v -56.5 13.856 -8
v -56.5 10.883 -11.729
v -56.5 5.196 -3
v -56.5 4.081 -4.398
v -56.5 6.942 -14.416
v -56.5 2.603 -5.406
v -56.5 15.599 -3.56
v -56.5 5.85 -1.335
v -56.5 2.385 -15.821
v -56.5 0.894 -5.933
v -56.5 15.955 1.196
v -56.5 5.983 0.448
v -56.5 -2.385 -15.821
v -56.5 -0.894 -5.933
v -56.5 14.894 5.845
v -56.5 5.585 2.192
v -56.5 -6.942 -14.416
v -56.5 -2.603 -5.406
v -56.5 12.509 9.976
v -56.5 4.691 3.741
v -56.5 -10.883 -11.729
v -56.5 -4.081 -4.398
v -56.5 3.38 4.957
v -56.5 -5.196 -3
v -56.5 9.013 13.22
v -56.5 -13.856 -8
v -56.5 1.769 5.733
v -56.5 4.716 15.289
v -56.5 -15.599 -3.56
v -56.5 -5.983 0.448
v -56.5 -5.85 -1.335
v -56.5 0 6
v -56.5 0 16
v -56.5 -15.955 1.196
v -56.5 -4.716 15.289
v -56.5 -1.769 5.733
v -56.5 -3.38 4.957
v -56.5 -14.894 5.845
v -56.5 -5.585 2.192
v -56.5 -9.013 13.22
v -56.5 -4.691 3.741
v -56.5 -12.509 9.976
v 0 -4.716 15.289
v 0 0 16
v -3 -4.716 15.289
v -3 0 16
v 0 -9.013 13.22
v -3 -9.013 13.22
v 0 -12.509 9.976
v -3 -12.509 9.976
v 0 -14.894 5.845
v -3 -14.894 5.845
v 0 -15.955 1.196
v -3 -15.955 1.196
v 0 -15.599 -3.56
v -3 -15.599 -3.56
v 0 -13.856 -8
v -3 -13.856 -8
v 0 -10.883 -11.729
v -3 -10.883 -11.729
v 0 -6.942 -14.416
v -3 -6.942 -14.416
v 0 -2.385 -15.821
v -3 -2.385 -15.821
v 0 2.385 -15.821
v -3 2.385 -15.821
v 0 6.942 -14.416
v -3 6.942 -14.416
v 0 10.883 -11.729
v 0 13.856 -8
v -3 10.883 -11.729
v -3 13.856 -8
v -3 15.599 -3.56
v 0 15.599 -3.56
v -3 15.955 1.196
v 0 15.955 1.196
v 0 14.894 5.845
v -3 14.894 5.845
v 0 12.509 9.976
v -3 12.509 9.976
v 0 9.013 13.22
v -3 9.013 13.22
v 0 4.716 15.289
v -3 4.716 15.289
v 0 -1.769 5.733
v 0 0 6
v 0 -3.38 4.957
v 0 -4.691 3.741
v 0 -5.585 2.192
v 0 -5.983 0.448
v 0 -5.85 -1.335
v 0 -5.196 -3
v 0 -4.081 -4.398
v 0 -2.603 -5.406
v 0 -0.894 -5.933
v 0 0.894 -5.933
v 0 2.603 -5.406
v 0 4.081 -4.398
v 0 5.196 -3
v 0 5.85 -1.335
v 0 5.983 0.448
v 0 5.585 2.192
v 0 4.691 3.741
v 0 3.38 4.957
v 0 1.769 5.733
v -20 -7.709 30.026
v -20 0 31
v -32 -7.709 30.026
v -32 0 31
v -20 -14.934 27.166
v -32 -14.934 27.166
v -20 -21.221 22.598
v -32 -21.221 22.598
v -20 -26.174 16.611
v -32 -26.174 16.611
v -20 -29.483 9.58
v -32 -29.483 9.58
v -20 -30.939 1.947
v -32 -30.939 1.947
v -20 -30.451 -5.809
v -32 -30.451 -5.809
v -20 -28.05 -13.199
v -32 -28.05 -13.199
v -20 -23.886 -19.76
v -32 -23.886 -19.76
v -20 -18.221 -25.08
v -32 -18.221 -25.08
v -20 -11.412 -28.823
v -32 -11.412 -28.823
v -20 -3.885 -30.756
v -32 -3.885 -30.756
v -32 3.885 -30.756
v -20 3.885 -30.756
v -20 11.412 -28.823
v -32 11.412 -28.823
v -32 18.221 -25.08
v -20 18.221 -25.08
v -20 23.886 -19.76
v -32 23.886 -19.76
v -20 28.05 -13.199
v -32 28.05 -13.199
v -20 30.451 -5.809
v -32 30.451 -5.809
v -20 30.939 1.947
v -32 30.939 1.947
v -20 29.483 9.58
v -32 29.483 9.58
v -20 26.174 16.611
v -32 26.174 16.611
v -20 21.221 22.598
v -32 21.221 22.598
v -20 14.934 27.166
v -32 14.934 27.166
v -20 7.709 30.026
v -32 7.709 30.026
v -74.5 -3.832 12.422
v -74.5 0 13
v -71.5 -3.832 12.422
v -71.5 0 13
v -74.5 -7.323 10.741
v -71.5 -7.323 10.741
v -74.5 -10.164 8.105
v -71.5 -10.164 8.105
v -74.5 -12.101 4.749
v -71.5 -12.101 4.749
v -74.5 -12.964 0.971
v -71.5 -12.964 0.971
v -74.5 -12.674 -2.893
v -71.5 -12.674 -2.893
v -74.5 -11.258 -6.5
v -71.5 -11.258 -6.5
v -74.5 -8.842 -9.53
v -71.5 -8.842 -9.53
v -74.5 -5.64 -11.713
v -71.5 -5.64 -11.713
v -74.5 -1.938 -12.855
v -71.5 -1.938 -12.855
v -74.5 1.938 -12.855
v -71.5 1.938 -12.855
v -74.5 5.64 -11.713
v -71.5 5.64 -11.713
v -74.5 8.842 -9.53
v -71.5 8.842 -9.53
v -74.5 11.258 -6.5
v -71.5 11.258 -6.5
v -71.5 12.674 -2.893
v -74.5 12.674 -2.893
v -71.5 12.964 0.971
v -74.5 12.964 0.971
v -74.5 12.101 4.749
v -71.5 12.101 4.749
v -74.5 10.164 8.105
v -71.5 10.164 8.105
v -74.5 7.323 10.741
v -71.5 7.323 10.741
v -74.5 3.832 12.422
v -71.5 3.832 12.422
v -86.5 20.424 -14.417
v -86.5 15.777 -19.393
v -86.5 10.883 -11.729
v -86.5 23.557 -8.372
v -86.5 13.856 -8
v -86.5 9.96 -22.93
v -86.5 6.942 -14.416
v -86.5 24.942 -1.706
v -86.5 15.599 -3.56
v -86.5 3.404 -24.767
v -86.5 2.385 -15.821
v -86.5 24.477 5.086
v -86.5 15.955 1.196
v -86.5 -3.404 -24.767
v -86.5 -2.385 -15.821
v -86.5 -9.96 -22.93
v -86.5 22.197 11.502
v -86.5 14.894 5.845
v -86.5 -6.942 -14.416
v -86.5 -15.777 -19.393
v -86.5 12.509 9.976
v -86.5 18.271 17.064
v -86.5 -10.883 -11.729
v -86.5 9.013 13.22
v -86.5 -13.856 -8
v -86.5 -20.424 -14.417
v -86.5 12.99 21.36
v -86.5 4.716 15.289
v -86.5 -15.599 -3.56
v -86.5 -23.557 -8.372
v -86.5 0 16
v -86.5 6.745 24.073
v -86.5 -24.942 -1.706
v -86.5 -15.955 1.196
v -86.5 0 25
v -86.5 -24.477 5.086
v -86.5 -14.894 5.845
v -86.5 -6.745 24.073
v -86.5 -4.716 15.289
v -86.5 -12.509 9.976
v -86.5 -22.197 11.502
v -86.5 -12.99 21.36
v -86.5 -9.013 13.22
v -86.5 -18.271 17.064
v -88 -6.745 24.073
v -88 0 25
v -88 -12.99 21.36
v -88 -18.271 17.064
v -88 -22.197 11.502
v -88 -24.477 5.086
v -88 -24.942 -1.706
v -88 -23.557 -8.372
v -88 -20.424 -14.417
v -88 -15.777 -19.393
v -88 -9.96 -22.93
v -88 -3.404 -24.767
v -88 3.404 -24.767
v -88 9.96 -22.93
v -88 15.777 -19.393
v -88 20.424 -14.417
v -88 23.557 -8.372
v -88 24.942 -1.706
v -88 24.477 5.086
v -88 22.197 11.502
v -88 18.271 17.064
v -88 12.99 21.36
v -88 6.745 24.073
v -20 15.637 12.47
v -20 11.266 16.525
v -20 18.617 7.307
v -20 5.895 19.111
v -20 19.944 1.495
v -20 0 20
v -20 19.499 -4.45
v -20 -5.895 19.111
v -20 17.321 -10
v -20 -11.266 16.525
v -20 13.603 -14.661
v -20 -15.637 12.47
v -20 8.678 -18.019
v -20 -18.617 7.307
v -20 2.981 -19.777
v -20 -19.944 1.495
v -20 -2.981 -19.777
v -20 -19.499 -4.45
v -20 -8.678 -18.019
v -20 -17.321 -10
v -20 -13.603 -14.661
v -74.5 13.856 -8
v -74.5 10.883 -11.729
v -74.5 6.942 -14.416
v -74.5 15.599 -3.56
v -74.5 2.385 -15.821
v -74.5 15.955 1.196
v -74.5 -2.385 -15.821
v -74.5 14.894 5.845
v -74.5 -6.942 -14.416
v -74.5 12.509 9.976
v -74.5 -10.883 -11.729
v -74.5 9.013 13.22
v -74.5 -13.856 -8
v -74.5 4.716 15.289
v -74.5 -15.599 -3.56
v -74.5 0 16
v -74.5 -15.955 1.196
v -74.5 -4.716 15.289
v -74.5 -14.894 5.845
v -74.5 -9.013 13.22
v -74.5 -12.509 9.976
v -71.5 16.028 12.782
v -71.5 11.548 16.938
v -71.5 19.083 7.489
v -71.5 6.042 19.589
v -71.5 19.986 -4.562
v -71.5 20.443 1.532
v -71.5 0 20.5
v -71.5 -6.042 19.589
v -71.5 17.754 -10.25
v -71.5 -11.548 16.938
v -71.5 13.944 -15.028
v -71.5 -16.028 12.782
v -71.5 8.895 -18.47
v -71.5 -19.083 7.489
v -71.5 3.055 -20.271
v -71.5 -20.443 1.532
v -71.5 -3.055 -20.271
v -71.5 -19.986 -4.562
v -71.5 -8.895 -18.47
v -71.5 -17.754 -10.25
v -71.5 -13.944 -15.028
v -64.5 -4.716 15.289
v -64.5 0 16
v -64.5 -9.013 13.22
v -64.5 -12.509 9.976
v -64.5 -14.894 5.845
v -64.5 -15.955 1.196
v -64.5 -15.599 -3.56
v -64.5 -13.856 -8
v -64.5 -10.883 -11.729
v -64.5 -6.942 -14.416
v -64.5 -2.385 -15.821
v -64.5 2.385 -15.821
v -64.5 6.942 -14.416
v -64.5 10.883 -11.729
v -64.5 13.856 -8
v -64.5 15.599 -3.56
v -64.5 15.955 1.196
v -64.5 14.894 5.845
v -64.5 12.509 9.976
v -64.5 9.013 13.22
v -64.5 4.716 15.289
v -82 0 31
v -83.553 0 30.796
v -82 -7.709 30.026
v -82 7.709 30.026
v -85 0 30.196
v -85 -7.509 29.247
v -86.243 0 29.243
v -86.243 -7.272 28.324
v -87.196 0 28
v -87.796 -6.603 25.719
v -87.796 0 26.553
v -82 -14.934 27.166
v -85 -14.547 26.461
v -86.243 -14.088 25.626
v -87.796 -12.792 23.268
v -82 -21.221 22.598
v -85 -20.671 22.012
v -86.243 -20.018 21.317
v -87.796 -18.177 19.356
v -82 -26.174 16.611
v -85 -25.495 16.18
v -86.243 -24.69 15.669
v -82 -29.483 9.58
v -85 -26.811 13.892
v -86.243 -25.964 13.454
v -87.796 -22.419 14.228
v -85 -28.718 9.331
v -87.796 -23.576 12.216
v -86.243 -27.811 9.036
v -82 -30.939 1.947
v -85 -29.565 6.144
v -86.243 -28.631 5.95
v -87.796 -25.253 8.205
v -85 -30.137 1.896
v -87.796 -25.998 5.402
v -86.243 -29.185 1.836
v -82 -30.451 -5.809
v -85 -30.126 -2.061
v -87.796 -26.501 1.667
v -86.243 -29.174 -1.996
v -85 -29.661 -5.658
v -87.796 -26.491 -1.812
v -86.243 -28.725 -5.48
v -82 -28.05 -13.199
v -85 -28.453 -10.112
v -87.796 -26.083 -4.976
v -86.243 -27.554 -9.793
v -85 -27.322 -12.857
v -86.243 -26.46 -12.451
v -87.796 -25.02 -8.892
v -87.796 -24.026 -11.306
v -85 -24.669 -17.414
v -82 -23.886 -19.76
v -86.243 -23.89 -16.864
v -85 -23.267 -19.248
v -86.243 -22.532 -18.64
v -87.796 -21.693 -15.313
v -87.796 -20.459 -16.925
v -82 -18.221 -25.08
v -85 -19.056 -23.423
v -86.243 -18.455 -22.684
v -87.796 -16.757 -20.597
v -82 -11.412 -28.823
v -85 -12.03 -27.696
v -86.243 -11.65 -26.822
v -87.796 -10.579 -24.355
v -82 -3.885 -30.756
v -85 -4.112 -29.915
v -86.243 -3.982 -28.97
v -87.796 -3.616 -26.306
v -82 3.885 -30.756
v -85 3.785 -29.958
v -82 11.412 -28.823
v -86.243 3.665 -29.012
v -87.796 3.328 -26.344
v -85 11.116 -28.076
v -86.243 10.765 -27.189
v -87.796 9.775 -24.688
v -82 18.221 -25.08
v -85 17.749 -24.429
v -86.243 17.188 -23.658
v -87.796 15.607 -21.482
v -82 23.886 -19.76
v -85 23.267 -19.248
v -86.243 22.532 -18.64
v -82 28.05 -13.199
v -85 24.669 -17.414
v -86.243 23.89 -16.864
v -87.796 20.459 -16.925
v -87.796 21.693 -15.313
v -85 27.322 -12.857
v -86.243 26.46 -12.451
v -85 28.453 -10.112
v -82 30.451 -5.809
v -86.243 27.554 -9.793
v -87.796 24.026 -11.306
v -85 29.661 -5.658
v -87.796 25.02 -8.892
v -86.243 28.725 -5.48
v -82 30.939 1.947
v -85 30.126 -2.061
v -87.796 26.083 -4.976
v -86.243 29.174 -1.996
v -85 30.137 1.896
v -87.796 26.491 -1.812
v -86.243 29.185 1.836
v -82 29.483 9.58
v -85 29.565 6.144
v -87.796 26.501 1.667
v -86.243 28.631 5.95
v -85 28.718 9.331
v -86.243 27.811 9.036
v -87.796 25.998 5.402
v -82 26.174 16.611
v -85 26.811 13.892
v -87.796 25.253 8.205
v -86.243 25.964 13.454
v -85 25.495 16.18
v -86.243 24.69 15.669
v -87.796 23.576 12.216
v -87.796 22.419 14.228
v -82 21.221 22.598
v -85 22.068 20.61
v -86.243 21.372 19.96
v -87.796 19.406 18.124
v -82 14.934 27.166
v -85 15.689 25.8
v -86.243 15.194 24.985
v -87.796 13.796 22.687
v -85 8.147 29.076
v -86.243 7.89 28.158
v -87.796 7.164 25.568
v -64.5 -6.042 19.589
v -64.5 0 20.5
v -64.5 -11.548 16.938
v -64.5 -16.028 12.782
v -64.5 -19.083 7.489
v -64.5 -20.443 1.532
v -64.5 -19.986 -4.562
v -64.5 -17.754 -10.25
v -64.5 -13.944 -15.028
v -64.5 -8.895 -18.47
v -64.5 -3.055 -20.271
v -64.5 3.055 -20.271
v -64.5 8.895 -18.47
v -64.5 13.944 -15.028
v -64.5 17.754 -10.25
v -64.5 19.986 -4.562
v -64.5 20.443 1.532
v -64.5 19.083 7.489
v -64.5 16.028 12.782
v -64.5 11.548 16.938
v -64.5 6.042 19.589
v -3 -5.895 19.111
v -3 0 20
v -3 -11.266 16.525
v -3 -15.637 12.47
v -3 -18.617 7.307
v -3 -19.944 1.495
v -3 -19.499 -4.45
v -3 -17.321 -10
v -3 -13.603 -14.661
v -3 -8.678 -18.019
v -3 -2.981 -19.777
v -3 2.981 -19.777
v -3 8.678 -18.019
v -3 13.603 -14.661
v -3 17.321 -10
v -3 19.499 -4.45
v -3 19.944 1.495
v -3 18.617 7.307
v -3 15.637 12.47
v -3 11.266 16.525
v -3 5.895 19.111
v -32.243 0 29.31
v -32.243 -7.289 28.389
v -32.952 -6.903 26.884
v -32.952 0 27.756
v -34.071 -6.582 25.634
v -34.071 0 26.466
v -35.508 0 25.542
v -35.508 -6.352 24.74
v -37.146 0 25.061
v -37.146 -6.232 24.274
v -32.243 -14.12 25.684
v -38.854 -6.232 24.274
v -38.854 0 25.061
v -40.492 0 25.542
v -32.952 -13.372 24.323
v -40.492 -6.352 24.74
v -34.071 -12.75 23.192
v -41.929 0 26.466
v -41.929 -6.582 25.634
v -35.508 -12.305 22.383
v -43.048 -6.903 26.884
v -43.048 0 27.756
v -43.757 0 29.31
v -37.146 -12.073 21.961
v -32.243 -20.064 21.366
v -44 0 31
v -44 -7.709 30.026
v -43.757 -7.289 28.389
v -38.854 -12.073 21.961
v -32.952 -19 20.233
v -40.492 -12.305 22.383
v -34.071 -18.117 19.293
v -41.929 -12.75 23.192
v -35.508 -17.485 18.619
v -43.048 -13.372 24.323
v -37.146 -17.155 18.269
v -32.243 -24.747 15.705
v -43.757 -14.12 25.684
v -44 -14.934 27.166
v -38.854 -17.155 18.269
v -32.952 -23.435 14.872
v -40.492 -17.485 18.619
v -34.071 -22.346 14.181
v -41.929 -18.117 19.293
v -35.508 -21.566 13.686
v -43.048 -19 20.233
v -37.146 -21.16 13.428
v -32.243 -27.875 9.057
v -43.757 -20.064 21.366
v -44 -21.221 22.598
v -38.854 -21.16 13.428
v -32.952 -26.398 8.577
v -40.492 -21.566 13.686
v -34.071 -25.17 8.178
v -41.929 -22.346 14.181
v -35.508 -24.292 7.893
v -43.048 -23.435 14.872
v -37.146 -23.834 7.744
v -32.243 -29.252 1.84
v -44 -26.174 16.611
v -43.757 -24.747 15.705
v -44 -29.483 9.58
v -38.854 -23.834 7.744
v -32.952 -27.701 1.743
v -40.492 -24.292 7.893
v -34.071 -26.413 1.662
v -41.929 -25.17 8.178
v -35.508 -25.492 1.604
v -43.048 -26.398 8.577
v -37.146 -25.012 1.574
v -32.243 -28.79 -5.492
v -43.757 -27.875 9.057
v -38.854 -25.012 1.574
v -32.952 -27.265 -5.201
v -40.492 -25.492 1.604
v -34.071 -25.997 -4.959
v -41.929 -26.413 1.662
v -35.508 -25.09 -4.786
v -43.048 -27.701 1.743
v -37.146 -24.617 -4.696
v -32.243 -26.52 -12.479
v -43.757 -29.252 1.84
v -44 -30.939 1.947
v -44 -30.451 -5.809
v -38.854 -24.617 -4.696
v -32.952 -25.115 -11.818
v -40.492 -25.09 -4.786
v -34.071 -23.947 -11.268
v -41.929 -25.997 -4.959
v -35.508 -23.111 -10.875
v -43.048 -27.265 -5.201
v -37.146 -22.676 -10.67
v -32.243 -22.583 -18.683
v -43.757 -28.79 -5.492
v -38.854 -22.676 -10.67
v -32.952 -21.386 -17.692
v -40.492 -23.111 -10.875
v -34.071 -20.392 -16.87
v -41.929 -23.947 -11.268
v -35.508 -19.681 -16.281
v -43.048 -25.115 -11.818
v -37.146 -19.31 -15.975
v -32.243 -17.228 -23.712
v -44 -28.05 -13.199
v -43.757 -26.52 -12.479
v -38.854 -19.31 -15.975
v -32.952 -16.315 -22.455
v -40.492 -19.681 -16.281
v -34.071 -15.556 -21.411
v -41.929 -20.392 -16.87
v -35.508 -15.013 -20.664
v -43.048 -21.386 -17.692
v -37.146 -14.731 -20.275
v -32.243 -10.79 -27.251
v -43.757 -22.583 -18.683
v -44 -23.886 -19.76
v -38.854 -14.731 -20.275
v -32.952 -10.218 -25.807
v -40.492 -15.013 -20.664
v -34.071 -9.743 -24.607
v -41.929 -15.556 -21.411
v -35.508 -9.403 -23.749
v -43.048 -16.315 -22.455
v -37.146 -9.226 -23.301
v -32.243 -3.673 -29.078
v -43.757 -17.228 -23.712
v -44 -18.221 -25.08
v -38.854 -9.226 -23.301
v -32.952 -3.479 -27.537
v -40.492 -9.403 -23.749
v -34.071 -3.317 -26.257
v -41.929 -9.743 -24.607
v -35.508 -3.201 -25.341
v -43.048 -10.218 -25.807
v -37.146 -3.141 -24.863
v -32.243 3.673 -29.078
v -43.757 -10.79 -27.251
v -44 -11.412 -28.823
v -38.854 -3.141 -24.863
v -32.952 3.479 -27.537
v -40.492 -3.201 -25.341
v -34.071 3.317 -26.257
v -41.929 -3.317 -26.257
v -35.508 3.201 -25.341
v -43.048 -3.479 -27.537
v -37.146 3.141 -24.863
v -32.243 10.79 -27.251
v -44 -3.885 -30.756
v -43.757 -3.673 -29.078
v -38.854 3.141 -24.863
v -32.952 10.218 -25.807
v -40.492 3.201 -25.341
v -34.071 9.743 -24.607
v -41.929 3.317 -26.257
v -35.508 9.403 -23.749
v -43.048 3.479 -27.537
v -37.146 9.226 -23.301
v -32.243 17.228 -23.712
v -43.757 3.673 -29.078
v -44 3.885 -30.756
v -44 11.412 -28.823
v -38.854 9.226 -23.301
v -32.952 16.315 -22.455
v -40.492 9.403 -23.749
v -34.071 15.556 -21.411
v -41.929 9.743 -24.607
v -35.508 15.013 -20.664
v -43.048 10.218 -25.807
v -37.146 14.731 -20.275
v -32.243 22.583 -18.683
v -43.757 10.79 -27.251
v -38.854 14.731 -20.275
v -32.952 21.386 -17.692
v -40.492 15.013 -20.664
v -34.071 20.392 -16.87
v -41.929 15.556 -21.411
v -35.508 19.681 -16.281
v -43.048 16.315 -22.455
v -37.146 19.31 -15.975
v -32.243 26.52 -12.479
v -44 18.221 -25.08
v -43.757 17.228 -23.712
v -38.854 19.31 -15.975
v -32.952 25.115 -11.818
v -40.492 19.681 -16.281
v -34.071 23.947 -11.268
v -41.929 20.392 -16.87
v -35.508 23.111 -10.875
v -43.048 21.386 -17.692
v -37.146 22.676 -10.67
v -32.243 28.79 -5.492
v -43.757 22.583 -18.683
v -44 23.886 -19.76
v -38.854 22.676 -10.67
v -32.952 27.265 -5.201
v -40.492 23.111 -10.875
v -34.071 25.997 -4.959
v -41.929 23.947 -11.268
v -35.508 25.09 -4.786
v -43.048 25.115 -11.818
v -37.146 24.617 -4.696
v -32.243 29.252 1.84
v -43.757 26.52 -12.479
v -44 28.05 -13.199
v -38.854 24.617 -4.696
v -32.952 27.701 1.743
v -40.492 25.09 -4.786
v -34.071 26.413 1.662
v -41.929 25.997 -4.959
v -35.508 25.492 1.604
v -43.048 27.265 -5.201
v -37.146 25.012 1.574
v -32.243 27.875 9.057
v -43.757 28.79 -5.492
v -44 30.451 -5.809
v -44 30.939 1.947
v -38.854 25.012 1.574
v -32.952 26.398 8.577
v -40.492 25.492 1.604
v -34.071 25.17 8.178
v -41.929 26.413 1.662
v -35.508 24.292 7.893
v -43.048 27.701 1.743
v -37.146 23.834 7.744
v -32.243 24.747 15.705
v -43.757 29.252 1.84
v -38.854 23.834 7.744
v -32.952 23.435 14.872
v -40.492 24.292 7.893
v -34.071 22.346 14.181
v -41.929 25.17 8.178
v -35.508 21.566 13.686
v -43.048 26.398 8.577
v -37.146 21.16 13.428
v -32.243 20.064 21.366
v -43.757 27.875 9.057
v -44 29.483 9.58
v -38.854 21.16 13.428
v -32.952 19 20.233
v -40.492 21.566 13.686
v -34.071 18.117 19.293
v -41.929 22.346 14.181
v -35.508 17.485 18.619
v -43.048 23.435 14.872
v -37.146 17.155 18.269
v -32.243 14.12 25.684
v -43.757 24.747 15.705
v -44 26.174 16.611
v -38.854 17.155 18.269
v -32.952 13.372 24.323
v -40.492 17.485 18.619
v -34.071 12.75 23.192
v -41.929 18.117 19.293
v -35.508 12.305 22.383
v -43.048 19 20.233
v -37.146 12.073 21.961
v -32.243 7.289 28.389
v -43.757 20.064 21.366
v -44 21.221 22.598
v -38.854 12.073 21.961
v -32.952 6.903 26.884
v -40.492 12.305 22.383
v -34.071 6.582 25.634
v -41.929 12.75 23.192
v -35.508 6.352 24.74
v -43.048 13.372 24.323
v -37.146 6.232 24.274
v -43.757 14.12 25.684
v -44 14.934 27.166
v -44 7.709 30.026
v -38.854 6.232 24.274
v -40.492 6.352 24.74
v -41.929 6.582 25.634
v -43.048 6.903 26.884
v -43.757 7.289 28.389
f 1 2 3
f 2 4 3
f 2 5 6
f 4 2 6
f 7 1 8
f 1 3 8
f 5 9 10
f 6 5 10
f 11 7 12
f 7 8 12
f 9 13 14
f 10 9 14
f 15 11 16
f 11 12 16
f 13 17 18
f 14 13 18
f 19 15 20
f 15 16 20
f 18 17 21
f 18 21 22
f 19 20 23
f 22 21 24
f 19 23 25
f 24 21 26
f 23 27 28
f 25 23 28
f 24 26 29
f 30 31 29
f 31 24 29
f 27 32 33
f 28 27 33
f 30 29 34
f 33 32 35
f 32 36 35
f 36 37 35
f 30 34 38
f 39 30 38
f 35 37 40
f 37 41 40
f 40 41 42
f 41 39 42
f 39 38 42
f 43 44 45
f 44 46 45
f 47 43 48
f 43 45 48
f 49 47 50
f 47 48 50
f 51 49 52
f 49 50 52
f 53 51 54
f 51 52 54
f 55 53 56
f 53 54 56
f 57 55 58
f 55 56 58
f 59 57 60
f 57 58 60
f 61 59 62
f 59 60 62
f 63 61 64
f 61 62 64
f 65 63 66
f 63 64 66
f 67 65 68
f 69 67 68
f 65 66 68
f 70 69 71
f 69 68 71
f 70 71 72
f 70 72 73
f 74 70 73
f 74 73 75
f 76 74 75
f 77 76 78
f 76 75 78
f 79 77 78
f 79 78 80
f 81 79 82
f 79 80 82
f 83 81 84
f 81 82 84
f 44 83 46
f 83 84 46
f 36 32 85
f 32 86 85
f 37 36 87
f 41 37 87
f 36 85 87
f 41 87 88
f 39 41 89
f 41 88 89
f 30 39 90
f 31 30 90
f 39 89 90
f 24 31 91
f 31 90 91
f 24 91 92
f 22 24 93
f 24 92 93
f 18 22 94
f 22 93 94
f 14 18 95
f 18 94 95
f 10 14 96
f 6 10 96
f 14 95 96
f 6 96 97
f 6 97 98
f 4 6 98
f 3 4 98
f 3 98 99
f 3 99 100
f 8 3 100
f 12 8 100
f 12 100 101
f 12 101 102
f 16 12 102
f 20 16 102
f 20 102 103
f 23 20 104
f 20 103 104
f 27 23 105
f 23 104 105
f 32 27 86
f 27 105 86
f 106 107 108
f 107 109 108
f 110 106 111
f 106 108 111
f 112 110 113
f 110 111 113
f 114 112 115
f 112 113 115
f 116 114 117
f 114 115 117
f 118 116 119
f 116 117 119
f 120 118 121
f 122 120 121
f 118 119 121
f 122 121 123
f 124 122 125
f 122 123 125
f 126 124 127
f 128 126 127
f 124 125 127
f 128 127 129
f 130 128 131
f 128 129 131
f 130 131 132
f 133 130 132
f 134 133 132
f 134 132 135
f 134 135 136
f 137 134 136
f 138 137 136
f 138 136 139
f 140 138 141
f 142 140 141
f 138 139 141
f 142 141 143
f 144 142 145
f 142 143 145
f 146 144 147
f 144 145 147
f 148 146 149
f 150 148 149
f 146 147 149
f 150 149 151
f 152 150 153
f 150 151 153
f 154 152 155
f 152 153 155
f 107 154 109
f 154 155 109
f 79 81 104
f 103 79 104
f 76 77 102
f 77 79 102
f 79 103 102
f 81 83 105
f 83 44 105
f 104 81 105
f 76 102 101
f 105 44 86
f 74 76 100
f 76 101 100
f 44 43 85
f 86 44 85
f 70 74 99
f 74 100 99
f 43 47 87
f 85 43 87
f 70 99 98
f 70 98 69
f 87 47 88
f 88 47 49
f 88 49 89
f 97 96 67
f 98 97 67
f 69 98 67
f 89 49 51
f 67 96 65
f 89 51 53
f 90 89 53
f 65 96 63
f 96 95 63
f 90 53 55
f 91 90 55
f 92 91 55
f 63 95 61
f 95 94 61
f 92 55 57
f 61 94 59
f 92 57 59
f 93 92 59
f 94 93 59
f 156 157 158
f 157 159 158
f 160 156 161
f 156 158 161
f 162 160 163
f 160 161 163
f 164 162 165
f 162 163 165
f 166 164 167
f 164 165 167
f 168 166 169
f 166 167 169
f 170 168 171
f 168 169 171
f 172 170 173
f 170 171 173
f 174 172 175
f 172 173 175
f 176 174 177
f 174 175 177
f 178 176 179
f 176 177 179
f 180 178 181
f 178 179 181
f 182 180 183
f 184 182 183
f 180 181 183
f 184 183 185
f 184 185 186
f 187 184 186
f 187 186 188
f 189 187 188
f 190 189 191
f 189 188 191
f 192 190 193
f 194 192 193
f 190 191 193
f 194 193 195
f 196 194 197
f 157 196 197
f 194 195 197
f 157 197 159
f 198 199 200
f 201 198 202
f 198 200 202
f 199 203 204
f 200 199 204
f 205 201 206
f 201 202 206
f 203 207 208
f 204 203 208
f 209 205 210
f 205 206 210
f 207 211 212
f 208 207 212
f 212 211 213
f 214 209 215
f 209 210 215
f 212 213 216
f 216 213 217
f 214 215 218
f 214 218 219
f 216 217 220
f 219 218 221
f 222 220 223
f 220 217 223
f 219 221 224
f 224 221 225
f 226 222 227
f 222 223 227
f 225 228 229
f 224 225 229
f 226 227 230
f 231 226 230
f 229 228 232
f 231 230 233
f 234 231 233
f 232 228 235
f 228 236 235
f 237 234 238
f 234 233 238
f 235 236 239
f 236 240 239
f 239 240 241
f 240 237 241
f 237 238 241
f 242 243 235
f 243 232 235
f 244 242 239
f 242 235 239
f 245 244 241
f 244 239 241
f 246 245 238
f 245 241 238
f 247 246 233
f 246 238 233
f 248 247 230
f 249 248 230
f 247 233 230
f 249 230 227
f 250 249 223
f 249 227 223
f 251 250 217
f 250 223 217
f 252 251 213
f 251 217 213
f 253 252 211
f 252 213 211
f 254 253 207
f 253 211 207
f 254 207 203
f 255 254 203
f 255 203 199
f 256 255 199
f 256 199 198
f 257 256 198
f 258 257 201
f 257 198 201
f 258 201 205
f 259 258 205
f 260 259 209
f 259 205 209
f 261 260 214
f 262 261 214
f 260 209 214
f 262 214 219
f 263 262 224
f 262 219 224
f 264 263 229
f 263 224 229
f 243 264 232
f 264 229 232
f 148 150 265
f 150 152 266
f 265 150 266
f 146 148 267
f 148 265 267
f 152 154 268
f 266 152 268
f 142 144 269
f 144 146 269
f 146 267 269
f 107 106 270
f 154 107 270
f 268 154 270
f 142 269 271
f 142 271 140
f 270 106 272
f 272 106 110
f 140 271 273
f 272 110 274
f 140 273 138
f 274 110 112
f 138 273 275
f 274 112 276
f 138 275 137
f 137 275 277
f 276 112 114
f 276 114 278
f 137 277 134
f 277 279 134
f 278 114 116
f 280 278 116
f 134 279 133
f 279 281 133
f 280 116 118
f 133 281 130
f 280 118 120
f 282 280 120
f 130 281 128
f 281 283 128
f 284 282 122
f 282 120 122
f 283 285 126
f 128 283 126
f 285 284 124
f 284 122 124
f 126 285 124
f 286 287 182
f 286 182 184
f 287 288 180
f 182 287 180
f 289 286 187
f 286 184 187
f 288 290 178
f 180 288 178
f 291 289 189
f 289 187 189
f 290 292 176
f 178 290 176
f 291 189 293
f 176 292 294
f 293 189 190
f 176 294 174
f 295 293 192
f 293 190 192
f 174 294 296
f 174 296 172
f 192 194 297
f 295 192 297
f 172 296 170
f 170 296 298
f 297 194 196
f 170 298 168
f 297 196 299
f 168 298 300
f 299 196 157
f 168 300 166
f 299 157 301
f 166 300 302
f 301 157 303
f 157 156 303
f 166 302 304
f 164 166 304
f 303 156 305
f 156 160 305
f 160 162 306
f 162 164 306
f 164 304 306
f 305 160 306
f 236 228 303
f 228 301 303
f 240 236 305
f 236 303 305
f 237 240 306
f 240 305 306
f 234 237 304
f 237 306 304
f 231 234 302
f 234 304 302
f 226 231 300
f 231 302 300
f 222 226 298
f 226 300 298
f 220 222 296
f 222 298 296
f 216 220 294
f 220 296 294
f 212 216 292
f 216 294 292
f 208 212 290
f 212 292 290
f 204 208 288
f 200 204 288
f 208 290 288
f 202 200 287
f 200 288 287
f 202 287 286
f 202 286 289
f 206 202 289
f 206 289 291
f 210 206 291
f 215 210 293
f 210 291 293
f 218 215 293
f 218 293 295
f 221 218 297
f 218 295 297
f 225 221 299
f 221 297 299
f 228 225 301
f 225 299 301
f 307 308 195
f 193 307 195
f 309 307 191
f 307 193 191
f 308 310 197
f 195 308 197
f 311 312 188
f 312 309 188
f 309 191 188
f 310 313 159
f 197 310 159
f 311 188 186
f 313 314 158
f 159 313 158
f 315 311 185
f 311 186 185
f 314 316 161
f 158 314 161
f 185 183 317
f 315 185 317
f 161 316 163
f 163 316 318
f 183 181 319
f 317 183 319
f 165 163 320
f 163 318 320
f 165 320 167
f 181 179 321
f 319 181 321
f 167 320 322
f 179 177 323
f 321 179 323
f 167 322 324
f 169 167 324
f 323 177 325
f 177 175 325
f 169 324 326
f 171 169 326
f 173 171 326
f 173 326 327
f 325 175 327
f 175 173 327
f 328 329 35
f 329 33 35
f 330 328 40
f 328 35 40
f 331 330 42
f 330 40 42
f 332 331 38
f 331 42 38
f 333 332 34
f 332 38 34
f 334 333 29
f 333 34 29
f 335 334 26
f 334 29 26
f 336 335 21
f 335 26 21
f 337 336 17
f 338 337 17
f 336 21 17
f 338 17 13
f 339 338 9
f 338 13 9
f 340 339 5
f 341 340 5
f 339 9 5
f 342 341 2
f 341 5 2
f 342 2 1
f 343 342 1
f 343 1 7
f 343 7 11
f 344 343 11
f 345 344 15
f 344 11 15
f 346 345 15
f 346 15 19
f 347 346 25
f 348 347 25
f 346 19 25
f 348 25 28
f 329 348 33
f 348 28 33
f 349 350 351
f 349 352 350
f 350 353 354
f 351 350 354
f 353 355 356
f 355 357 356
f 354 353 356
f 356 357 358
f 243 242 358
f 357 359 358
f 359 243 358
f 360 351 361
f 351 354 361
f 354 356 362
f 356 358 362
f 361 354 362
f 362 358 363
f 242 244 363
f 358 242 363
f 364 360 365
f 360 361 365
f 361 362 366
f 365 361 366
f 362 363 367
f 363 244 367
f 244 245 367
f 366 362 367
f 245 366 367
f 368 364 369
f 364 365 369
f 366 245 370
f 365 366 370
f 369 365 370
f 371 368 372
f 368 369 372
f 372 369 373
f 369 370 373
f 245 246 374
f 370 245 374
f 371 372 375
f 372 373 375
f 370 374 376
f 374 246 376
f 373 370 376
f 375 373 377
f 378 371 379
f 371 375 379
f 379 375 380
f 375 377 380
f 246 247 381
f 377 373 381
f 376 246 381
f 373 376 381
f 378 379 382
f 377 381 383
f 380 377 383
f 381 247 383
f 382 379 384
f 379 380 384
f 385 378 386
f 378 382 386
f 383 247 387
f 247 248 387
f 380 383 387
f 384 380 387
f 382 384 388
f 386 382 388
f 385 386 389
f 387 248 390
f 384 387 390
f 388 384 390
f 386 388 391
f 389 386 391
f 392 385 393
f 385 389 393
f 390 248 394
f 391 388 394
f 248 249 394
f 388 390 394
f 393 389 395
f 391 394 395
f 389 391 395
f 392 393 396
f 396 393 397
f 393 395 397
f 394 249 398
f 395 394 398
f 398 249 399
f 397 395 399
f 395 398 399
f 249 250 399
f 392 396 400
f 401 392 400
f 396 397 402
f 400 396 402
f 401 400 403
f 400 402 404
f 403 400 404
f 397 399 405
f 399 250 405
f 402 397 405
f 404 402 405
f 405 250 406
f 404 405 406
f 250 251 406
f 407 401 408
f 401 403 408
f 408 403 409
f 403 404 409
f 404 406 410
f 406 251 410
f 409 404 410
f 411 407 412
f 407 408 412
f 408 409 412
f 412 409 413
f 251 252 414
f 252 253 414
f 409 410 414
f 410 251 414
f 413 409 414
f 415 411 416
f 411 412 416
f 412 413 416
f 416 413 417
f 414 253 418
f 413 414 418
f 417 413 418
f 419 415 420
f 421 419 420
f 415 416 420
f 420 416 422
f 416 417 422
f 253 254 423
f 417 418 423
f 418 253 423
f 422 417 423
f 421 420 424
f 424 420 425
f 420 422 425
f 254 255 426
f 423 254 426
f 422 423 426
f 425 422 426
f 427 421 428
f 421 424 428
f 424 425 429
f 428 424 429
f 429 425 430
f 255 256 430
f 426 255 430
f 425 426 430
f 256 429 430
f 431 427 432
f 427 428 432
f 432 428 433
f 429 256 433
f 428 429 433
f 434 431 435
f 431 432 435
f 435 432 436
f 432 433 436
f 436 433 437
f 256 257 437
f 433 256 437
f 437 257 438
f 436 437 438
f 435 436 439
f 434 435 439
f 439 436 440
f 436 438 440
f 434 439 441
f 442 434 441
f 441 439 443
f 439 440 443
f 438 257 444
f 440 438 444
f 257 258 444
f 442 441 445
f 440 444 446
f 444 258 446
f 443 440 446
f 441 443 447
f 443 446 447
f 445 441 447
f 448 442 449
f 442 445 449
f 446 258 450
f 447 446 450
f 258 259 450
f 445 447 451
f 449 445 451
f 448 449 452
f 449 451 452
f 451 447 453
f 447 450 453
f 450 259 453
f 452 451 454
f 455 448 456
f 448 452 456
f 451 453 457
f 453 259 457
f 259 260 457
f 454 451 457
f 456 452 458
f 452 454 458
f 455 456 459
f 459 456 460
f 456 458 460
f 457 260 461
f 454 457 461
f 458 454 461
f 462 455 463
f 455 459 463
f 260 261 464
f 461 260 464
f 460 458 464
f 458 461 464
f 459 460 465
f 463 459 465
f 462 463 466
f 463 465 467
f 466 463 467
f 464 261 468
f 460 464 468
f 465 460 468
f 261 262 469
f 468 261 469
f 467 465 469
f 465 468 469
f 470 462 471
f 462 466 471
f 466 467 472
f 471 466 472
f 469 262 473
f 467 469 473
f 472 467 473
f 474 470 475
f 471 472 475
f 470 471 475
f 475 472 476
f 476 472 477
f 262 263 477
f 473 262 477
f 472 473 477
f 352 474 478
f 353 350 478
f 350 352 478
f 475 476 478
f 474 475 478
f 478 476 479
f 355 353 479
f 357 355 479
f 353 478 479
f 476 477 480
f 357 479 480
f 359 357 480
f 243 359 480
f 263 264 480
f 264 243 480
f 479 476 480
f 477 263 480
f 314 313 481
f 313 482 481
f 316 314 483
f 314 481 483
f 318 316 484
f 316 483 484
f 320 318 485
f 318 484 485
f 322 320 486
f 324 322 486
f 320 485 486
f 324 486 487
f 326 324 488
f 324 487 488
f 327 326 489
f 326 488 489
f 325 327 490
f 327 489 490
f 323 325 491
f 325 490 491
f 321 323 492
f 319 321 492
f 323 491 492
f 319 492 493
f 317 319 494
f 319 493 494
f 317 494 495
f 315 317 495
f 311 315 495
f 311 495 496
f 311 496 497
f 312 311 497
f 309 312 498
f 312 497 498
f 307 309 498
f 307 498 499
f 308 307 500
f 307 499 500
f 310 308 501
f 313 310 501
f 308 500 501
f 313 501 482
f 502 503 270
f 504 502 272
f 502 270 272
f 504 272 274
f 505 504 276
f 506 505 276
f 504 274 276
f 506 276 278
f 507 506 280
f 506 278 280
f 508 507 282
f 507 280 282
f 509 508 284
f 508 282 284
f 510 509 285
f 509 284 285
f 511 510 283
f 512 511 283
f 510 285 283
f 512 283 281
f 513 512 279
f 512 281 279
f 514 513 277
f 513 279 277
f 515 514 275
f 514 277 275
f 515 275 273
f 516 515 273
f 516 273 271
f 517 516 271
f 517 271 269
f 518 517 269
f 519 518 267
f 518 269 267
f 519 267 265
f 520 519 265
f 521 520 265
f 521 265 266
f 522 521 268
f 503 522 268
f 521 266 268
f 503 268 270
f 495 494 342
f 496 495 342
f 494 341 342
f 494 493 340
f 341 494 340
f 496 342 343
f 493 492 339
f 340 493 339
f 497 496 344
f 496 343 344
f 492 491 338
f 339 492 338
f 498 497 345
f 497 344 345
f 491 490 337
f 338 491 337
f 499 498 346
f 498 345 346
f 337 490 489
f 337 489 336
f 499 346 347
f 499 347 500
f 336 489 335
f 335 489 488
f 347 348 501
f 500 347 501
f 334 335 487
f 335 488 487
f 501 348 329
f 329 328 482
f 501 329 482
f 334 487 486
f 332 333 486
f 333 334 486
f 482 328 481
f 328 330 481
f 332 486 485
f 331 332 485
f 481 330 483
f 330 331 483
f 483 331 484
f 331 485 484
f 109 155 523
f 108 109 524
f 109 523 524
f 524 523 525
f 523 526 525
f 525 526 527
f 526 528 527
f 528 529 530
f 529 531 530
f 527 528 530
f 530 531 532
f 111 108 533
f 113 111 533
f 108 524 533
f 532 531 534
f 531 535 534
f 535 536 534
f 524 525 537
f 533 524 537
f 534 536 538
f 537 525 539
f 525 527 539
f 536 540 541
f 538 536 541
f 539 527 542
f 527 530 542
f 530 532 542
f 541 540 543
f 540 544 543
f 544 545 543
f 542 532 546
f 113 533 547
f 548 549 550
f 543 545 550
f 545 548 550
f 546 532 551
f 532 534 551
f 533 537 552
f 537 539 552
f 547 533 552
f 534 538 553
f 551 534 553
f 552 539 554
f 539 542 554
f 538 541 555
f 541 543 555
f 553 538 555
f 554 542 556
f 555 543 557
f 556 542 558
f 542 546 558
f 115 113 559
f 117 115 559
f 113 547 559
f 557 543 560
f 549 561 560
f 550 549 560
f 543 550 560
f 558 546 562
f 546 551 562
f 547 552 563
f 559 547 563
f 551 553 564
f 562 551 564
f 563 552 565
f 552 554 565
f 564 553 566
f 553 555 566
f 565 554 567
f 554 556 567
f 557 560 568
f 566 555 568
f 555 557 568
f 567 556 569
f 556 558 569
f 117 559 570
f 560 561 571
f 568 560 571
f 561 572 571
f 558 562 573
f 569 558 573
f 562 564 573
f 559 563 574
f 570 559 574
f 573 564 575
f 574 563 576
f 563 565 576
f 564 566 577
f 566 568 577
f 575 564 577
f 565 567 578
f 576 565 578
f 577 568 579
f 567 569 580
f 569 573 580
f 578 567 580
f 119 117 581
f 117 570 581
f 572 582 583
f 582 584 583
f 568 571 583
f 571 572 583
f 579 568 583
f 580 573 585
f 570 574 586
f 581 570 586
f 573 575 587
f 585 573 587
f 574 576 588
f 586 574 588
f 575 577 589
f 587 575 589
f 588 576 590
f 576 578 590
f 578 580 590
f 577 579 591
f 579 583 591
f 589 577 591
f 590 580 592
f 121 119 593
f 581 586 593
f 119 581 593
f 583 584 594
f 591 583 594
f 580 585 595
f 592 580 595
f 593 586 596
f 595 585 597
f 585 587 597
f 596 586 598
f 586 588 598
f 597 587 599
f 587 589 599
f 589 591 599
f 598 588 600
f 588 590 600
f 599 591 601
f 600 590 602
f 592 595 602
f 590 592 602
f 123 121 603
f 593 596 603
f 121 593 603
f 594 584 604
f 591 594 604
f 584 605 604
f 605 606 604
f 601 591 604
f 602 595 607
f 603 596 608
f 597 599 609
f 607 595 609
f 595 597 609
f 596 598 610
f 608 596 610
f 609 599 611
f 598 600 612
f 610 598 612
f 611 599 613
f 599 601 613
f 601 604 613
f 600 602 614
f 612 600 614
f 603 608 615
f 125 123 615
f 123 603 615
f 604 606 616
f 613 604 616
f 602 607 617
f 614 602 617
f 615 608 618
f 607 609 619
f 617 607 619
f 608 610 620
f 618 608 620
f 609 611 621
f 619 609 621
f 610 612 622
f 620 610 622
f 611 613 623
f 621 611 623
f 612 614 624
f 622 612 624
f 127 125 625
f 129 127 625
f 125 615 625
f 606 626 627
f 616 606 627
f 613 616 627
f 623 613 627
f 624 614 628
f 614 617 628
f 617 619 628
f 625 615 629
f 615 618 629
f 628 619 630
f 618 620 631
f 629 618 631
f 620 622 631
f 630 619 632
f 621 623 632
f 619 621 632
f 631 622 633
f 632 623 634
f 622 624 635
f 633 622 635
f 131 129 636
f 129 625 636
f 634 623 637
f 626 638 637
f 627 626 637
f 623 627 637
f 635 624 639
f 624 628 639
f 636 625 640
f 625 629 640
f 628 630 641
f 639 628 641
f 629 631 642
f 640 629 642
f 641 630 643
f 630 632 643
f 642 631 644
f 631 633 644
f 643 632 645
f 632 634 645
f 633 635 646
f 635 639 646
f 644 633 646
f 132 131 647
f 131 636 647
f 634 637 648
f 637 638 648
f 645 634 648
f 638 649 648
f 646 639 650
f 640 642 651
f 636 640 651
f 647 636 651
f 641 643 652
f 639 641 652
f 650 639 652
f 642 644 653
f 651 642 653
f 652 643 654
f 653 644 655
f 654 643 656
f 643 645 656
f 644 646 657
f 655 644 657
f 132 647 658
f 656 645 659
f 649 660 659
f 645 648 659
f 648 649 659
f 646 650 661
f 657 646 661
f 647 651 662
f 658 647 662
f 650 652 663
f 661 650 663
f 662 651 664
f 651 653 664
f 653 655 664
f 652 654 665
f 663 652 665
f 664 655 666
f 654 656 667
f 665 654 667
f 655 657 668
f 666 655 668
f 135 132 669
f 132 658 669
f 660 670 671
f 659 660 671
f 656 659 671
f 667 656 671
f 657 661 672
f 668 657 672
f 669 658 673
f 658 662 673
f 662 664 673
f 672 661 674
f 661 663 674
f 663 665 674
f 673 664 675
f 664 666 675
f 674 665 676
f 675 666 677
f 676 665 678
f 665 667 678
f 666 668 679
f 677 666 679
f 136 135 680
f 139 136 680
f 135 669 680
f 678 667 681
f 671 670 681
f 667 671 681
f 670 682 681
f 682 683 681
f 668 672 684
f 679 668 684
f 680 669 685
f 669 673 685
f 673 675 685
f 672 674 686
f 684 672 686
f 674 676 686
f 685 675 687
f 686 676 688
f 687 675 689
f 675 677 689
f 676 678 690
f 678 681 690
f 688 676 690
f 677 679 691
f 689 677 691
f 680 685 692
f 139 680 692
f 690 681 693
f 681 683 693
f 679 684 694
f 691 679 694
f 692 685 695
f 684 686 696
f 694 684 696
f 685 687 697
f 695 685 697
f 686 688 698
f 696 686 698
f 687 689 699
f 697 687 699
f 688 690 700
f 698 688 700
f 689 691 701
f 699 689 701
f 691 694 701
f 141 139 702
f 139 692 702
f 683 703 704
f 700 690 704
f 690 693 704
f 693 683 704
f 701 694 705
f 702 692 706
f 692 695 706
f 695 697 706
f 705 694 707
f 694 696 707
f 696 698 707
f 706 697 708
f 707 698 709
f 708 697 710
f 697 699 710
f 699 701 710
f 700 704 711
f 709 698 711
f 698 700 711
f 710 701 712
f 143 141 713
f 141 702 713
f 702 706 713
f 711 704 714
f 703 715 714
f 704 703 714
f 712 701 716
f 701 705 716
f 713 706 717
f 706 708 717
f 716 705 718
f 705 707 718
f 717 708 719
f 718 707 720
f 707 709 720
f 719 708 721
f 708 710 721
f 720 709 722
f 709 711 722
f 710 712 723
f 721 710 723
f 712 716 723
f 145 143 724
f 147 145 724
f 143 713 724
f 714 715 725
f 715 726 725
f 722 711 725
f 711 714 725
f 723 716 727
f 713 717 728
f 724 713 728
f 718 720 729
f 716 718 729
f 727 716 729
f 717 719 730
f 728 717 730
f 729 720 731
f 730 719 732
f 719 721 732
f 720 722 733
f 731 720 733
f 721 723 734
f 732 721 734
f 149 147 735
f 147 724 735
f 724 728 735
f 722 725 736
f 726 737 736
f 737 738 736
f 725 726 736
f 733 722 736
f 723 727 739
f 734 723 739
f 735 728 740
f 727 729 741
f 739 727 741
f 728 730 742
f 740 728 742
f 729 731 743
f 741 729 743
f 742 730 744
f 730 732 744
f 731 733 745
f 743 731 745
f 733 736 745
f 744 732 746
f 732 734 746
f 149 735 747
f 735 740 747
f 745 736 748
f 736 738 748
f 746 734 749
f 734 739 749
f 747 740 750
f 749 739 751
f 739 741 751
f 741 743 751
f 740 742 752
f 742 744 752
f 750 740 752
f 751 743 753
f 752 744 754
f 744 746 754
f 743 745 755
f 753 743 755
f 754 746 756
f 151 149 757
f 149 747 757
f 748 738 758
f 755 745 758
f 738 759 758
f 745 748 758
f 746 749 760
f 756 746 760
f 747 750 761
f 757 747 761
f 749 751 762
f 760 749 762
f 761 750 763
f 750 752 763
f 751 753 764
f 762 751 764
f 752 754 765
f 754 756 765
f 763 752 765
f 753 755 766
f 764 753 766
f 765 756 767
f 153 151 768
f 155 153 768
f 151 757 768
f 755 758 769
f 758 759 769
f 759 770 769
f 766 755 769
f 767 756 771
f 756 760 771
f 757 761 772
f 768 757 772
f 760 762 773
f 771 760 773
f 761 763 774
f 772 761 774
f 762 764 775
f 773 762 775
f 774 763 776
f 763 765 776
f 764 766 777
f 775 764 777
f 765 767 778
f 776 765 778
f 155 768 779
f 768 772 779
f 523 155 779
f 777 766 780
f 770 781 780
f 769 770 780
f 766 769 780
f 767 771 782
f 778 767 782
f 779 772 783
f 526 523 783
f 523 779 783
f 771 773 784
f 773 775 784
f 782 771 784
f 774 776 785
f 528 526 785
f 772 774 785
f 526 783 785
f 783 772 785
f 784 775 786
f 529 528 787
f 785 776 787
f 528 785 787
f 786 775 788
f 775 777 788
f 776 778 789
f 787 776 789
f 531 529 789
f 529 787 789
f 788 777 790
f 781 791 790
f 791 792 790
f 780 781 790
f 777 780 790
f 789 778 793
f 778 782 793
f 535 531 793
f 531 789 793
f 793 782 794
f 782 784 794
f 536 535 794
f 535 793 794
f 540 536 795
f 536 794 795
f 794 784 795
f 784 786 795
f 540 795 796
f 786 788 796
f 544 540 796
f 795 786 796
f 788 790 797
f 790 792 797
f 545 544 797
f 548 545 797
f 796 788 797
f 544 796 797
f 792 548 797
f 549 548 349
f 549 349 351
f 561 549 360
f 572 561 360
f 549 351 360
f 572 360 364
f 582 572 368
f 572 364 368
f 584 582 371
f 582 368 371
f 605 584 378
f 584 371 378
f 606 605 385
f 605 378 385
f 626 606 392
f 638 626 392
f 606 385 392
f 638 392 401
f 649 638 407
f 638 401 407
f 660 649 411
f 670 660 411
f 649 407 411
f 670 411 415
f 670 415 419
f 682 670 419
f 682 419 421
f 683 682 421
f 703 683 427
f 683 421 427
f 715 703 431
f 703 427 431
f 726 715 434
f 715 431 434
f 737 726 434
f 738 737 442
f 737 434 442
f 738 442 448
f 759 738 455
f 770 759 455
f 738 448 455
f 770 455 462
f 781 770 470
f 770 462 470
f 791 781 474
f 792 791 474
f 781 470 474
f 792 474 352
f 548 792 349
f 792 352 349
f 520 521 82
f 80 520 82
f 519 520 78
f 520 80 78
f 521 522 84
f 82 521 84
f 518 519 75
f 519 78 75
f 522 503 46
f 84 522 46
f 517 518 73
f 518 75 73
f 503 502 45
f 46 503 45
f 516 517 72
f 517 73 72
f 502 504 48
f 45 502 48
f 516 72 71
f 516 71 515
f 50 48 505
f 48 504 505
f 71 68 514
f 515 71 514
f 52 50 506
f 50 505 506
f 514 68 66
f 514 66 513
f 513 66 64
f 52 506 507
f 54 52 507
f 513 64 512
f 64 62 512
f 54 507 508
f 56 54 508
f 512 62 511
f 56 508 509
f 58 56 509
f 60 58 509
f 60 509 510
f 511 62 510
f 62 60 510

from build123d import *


with BuildPart() as f1:
    # F0 (on Front) → F1 (revolve)
    with BuildSketch(Plane.XZ):
        with BuildLine():
            Line((-56.5, 6), (0, 6))
            Line((0, 6), (0, 16))
            Line((0, 16), (-3, 16))
            Line((-3, 16), (-3, 20))
            Line((-3, 20), (-20, 20))
            Line((-20, 20), (-20, 31))
            Line((-20, 31), (-32, 31))
            ThreePointArc((-32, 31), (-38, 25), (-44, 31))
            Line((-44, 31), (-82, 31))
            ThreePointArc((-82, 31), (-86.242641, 29.242641), (-88, 25))
            Line((-88, 25), (-86.5, 25))
            Line((-86.5, 25), (-86.5, 16))
            Line((-86.5, 16), (-74.5, 16))
            Line((-74.5, 16), (-74.5, 13))
            Line((-74.5, 13), (-71.5, 13))
            Line((-71.5, 13), (-71.5, 20.5))
            Line((-71.5, 20.5), (-64.5, 20.5))
            Line((-64.5, 20.5), (-64.5, 16))
            Line((-64.5, 16), (-56.5, 16))
            Line((-56.5, 16), (-56.5, 6))
        make_face()
    revolve(axis=Axis((-44, 0, 0), (1, 0, 0)))


solid = f1.part
